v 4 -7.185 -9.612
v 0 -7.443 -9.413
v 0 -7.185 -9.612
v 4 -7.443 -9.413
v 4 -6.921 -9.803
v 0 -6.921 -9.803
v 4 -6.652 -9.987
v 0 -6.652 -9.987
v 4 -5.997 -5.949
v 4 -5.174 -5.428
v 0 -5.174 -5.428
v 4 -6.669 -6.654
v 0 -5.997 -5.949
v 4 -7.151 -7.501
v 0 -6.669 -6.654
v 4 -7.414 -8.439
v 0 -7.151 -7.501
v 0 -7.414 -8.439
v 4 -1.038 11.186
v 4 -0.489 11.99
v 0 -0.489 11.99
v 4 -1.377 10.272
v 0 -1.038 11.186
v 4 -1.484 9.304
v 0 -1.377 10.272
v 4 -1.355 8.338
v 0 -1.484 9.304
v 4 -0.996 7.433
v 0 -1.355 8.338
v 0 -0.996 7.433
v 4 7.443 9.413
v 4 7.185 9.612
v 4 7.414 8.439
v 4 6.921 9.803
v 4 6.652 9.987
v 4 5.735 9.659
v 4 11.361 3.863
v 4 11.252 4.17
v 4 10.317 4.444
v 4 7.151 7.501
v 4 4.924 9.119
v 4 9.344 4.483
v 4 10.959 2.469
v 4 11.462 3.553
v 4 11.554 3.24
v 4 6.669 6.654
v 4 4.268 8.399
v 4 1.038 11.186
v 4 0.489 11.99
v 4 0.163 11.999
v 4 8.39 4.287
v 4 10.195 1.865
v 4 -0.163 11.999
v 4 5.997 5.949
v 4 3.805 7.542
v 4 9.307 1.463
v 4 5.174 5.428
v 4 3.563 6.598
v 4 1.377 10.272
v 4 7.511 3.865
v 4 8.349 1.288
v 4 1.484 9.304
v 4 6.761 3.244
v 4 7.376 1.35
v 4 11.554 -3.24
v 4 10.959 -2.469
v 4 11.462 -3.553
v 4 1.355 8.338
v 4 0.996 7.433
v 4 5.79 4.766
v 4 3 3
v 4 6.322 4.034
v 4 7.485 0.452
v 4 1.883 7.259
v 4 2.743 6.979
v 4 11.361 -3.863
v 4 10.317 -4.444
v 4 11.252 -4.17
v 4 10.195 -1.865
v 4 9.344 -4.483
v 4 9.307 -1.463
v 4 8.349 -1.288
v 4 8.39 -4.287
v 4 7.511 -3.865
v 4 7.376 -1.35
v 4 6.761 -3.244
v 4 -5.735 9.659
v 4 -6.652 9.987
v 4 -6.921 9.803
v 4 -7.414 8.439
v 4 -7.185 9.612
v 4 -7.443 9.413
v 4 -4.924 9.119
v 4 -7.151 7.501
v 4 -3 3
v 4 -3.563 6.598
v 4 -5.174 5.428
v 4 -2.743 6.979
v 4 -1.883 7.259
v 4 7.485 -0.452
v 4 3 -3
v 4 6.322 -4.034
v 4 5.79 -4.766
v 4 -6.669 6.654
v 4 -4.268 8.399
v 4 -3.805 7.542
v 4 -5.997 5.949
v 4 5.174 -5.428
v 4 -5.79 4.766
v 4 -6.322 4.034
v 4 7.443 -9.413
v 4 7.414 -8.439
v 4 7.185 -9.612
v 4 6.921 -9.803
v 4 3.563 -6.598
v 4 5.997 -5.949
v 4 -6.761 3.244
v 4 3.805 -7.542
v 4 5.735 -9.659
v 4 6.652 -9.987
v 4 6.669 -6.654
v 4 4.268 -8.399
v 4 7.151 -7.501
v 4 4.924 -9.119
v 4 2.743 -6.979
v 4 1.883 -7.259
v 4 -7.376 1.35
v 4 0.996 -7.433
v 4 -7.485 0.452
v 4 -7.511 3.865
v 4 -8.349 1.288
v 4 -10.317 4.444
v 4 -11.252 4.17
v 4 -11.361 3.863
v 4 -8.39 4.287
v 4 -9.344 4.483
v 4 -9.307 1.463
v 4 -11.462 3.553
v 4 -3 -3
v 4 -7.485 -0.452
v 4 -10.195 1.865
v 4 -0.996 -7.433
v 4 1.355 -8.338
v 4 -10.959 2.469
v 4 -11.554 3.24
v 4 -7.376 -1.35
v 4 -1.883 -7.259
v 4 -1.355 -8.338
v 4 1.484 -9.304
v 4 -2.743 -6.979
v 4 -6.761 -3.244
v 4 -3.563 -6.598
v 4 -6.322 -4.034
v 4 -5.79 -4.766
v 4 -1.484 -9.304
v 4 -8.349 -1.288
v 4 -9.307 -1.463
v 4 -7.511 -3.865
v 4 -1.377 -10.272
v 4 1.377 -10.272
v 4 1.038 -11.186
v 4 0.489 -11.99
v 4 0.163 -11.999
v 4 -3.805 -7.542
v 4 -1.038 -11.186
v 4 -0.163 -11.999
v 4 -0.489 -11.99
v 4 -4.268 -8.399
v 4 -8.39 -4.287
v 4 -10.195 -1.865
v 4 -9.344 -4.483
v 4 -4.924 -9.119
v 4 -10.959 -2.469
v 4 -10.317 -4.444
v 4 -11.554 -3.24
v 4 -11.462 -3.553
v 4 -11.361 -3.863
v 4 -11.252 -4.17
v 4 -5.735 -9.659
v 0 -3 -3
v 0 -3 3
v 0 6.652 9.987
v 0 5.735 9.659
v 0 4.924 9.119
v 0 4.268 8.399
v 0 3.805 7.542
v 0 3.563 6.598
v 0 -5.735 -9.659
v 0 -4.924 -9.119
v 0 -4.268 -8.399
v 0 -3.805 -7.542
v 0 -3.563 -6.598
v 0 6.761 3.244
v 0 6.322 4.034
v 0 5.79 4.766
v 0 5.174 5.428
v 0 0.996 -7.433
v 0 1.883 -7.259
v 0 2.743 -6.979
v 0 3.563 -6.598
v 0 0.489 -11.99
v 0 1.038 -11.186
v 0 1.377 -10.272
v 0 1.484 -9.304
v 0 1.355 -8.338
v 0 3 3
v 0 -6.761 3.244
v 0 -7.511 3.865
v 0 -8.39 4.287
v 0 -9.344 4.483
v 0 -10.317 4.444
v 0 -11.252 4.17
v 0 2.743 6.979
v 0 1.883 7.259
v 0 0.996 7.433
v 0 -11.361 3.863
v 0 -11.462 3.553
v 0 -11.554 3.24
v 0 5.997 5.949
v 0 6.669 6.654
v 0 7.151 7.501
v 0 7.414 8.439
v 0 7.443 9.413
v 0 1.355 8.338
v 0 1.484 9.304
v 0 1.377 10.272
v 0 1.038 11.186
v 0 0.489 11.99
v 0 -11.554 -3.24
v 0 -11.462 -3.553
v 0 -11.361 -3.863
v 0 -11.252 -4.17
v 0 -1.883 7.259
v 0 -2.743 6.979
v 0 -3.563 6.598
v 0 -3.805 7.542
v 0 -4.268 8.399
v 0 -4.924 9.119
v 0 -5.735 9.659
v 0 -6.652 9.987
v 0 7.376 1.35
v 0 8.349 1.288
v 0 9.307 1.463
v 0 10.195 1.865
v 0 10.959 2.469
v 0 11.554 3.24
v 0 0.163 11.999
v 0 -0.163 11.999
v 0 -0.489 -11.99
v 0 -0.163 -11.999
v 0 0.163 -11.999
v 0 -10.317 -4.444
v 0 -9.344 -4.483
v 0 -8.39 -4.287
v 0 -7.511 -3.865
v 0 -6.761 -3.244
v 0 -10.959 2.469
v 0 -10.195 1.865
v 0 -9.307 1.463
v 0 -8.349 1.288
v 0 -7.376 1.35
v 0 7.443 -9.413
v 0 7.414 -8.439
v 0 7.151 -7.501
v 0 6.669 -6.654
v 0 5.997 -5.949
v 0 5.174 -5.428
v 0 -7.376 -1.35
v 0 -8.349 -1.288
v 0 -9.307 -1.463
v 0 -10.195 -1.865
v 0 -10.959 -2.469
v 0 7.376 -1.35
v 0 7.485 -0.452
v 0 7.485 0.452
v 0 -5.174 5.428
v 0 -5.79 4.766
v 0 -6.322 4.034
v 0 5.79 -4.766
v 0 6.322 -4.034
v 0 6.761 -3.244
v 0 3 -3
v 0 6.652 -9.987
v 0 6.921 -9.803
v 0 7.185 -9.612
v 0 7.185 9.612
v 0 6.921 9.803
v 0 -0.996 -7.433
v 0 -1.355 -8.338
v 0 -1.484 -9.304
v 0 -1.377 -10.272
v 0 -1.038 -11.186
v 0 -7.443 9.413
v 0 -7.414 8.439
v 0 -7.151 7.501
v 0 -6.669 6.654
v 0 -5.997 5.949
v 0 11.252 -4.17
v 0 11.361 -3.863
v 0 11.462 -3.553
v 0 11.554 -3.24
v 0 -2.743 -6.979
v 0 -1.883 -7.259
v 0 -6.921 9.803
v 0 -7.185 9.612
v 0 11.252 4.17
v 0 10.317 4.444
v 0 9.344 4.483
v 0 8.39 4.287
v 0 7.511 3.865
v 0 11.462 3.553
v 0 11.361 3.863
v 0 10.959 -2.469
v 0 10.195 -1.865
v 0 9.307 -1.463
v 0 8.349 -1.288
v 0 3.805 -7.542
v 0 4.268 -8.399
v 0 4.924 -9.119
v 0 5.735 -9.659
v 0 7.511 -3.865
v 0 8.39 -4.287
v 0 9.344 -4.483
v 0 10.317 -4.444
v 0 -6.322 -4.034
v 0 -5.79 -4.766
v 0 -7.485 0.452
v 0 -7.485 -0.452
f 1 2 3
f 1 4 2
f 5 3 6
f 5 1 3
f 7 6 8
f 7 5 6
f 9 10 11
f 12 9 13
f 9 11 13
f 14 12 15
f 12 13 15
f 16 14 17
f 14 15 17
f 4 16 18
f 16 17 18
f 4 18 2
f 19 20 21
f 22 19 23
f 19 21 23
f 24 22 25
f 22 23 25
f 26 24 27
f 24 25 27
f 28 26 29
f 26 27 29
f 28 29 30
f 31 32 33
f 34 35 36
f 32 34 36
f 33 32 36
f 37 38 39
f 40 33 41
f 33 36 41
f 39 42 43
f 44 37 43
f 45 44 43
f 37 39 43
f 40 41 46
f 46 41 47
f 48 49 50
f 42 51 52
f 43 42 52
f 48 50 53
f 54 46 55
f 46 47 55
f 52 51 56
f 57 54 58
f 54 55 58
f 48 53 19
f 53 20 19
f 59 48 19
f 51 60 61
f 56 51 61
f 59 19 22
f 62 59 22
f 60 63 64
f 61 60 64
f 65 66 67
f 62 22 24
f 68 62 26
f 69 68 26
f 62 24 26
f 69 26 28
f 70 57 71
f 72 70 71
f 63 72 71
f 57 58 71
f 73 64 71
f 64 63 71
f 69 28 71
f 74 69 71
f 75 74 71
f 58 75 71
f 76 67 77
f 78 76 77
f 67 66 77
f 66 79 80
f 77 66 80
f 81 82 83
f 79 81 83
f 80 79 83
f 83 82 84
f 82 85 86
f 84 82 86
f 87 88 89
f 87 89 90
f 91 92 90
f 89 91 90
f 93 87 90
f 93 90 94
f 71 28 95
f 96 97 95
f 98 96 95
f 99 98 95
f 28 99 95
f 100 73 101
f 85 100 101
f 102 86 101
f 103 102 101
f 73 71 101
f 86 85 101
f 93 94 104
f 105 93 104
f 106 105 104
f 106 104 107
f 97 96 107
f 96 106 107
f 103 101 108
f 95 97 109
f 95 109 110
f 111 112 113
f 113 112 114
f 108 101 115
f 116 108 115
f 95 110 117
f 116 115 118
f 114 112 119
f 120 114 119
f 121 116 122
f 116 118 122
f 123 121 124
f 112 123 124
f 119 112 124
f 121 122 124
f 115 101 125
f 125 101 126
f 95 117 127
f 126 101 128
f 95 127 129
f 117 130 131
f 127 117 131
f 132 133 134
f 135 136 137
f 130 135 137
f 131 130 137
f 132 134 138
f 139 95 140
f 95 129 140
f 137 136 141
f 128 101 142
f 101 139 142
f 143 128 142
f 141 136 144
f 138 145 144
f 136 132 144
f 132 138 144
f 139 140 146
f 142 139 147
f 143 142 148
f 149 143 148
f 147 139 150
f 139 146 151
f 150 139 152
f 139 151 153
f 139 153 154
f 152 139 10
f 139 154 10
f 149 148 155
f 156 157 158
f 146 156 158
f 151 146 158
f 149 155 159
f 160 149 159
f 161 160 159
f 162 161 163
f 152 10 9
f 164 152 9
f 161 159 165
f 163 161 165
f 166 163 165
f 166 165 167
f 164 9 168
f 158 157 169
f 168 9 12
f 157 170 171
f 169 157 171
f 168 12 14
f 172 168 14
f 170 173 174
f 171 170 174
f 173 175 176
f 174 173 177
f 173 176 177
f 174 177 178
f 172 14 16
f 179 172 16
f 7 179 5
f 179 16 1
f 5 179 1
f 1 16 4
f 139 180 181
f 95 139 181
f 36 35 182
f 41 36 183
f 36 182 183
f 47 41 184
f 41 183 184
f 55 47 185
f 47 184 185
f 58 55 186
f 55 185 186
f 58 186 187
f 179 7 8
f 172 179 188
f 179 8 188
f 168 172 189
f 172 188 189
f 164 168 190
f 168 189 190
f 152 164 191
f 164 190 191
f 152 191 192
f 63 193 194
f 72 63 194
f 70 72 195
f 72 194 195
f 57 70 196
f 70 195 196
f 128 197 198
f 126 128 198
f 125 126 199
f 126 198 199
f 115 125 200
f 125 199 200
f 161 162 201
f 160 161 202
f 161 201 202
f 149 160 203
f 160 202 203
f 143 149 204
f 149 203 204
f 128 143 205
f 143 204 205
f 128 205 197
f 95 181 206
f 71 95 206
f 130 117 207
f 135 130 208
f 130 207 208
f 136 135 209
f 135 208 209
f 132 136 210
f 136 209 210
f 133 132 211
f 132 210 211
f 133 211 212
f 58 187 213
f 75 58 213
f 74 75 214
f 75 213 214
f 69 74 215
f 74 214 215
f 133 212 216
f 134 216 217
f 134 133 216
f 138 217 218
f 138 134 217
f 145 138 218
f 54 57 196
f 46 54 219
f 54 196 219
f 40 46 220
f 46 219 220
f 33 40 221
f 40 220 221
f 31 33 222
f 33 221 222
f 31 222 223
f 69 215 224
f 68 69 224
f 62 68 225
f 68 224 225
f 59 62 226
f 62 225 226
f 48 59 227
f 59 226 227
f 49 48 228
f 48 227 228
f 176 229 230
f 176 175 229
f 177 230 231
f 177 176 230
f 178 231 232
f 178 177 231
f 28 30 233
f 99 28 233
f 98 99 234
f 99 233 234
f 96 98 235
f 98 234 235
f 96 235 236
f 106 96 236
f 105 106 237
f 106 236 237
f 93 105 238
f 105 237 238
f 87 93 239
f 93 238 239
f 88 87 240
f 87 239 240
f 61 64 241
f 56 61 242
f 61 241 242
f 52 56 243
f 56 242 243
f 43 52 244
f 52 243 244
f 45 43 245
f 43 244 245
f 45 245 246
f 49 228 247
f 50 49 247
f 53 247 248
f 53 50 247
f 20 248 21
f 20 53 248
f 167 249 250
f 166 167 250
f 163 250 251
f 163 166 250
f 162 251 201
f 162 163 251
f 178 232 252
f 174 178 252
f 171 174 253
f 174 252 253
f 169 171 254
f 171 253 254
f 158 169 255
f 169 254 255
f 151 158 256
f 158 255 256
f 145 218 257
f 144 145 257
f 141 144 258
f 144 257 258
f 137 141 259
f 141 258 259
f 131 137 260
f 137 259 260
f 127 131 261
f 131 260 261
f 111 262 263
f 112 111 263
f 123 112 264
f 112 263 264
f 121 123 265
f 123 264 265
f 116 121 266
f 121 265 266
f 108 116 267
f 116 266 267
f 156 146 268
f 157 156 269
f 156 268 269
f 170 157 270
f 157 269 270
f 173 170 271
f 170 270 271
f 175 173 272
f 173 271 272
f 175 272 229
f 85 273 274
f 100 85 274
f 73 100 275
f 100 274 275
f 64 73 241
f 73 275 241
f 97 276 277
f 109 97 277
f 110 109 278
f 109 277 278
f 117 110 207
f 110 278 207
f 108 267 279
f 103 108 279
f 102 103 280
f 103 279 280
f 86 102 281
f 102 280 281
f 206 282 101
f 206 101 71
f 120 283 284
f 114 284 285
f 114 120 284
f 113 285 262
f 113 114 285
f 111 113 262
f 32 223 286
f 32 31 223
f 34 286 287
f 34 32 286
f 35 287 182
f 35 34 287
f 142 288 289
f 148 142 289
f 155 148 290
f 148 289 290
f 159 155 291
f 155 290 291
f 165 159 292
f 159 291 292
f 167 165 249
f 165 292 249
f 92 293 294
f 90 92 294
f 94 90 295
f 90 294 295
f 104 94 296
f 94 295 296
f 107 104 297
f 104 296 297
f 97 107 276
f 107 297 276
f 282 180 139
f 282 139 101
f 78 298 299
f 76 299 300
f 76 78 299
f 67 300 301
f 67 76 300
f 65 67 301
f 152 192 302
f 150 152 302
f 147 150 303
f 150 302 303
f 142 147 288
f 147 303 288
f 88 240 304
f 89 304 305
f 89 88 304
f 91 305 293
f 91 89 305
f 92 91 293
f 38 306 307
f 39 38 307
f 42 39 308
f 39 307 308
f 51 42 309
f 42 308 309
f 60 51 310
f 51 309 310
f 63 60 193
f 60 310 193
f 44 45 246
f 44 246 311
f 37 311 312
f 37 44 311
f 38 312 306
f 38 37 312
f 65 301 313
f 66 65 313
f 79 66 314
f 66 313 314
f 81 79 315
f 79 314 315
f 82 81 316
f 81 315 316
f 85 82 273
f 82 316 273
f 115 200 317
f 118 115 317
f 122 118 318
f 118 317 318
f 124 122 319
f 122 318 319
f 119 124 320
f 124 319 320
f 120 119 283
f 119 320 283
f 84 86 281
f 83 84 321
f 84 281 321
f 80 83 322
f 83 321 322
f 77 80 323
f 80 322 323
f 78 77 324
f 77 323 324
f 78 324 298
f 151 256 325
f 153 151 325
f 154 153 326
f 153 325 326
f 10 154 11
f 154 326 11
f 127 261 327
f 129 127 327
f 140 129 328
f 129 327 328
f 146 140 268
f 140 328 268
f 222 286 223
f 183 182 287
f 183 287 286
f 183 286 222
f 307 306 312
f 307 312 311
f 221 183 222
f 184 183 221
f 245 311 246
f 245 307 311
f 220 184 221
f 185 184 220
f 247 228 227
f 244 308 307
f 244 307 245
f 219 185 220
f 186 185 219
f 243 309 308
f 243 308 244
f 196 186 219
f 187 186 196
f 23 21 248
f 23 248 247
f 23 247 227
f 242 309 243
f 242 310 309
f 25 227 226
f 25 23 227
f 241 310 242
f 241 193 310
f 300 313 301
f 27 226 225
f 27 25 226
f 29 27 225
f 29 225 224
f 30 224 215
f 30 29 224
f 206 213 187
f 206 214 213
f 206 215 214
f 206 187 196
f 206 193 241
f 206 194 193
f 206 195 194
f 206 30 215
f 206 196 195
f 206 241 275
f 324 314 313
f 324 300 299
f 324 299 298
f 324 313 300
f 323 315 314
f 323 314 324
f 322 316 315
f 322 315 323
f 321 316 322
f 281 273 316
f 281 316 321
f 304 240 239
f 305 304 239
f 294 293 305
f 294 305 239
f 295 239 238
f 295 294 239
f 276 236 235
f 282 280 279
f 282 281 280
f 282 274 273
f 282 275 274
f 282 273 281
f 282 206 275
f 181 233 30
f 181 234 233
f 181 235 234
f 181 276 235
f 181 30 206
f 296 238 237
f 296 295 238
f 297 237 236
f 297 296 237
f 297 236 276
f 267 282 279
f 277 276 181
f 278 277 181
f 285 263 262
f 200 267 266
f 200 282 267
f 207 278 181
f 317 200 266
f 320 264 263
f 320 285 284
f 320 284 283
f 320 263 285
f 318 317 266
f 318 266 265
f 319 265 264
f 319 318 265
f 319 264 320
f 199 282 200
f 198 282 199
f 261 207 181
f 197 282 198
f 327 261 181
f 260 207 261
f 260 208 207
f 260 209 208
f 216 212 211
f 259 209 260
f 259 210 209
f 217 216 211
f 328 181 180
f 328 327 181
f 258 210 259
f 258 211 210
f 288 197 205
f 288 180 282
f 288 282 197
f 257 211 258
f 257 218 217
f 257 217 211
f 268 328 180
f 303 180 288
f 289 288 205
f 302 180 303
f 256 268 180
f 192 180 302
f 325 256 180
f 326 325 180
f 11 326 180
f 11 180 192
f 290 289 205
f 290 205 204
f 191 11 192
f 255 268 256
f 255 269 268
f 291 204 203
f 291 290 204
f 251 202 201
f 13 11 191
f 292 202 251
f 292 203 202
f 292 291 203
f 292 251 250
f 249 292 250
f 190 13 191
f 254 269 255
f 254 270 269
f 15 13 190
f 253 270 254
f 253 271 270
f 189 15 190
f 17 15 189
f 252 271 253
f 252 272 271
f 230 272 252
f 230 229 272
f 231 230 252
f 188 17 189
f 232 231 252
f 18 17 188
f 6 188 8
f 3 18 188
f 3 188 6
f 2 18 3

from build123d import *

# Parameters (mm, degrees)
BASPROSKE_W         = 4
BASPROSKE_H         = 12
TOOTHCUT_DEPTH      = 18.435595774
TEETHCUTS_COUNT     = 10
TEETHCUTS_ANGLE     = 324
BORSKE_R            = 1
BORE_DEPTH          = 50.0000508
SKETCH_1_W          = 6
SKETCH_1_H          = 6
CUT_EXTRUDE_2_DEPTH = 18.131831434


with BuildPart() as part:
    # BasProSke → Base-Revolve (revolve)
    with BuildSketch(Plane(origin=(0, 0, 0), x_dir=(1, 0, 0), z_dir=(0, 1, 0)), mode=Mode.PRIVATE) as base_revolve_sk:
        with Locations((2, 6)):
            Rectangle(BASPROSKE_W, BASPROSKE_H)
    revolve(base_revolve_sk.sketch.rotate(Axis((-10, 0, 0), (1, 0, 0)), 180), axis=Axis((-10, 0, 0), (1, 0, 0)))

    # TooCutSke → ToothCut (cut, through all)
    with BuildSketch(Plane(origin=(0, 0, 0), x_dir=(0, 0, -1), z_dir=(1, 0, 0))):
        with BuildLine():
            ThreePointArc((1.349961767, 7.376489967), (0, 7.499), (-1.349961767, 7.376489967))
            ThreePointArc((-1.349961767, 7.376489967), (-1.644412889, 9.779161882), (-3.270793922, 11.572041837))
            ThreePointArc((-3.270793922, 11.572041837), (0, 12.0254), (3.270793922, 11.572041837))
            ThreePointArc((3.270793922, 11.572041837), (1.644412889, 9.779161882), (1.349961767, 7.376489967))
        make_face()
    toothcut = extrude(amount=TOOTHCUT_DEPTH, mode=Mode.SUBTRACT)

    # TeethCuts: ToothCut ×10 about axis
    teethcuts_axis = Axis((-10, 0, 0), (1, 0, 0))
    for i in range(1, TEETHCUTS_COUNT):
        add(toothcut.rotate(teethcuts_axis, i * TEETHCUTS_ANGLE / (TEETHCUTS_COUNT - 1)), mode=Mode.SUBTRACT)

    # BorSke → Bore (cut, symmetric)
    with BuildSketch(Plane(origin=(0, 0, 0), x_dir=(0, 0, -1), z_dir=(1, 0, 0))):
        with Locations(Location((0, 0, 0), (0, 0, 180))):
            Circle(BORSKE_R)
    extrude(amount=BORE_DEPTH, both=True, mode=Mode.SUBTRACT)

    # 草图1 → 切除-拉伸2 (cut, through all)
    with BuildSketch(Plane.ZY):
        Rectangle(SKETCH_1_W, SKETCH_1_H)
    extrude(amount=-CUT_EXTRUDE_2_DEPTH, mode=Mode.SUBTRACT)


solid = part.part
